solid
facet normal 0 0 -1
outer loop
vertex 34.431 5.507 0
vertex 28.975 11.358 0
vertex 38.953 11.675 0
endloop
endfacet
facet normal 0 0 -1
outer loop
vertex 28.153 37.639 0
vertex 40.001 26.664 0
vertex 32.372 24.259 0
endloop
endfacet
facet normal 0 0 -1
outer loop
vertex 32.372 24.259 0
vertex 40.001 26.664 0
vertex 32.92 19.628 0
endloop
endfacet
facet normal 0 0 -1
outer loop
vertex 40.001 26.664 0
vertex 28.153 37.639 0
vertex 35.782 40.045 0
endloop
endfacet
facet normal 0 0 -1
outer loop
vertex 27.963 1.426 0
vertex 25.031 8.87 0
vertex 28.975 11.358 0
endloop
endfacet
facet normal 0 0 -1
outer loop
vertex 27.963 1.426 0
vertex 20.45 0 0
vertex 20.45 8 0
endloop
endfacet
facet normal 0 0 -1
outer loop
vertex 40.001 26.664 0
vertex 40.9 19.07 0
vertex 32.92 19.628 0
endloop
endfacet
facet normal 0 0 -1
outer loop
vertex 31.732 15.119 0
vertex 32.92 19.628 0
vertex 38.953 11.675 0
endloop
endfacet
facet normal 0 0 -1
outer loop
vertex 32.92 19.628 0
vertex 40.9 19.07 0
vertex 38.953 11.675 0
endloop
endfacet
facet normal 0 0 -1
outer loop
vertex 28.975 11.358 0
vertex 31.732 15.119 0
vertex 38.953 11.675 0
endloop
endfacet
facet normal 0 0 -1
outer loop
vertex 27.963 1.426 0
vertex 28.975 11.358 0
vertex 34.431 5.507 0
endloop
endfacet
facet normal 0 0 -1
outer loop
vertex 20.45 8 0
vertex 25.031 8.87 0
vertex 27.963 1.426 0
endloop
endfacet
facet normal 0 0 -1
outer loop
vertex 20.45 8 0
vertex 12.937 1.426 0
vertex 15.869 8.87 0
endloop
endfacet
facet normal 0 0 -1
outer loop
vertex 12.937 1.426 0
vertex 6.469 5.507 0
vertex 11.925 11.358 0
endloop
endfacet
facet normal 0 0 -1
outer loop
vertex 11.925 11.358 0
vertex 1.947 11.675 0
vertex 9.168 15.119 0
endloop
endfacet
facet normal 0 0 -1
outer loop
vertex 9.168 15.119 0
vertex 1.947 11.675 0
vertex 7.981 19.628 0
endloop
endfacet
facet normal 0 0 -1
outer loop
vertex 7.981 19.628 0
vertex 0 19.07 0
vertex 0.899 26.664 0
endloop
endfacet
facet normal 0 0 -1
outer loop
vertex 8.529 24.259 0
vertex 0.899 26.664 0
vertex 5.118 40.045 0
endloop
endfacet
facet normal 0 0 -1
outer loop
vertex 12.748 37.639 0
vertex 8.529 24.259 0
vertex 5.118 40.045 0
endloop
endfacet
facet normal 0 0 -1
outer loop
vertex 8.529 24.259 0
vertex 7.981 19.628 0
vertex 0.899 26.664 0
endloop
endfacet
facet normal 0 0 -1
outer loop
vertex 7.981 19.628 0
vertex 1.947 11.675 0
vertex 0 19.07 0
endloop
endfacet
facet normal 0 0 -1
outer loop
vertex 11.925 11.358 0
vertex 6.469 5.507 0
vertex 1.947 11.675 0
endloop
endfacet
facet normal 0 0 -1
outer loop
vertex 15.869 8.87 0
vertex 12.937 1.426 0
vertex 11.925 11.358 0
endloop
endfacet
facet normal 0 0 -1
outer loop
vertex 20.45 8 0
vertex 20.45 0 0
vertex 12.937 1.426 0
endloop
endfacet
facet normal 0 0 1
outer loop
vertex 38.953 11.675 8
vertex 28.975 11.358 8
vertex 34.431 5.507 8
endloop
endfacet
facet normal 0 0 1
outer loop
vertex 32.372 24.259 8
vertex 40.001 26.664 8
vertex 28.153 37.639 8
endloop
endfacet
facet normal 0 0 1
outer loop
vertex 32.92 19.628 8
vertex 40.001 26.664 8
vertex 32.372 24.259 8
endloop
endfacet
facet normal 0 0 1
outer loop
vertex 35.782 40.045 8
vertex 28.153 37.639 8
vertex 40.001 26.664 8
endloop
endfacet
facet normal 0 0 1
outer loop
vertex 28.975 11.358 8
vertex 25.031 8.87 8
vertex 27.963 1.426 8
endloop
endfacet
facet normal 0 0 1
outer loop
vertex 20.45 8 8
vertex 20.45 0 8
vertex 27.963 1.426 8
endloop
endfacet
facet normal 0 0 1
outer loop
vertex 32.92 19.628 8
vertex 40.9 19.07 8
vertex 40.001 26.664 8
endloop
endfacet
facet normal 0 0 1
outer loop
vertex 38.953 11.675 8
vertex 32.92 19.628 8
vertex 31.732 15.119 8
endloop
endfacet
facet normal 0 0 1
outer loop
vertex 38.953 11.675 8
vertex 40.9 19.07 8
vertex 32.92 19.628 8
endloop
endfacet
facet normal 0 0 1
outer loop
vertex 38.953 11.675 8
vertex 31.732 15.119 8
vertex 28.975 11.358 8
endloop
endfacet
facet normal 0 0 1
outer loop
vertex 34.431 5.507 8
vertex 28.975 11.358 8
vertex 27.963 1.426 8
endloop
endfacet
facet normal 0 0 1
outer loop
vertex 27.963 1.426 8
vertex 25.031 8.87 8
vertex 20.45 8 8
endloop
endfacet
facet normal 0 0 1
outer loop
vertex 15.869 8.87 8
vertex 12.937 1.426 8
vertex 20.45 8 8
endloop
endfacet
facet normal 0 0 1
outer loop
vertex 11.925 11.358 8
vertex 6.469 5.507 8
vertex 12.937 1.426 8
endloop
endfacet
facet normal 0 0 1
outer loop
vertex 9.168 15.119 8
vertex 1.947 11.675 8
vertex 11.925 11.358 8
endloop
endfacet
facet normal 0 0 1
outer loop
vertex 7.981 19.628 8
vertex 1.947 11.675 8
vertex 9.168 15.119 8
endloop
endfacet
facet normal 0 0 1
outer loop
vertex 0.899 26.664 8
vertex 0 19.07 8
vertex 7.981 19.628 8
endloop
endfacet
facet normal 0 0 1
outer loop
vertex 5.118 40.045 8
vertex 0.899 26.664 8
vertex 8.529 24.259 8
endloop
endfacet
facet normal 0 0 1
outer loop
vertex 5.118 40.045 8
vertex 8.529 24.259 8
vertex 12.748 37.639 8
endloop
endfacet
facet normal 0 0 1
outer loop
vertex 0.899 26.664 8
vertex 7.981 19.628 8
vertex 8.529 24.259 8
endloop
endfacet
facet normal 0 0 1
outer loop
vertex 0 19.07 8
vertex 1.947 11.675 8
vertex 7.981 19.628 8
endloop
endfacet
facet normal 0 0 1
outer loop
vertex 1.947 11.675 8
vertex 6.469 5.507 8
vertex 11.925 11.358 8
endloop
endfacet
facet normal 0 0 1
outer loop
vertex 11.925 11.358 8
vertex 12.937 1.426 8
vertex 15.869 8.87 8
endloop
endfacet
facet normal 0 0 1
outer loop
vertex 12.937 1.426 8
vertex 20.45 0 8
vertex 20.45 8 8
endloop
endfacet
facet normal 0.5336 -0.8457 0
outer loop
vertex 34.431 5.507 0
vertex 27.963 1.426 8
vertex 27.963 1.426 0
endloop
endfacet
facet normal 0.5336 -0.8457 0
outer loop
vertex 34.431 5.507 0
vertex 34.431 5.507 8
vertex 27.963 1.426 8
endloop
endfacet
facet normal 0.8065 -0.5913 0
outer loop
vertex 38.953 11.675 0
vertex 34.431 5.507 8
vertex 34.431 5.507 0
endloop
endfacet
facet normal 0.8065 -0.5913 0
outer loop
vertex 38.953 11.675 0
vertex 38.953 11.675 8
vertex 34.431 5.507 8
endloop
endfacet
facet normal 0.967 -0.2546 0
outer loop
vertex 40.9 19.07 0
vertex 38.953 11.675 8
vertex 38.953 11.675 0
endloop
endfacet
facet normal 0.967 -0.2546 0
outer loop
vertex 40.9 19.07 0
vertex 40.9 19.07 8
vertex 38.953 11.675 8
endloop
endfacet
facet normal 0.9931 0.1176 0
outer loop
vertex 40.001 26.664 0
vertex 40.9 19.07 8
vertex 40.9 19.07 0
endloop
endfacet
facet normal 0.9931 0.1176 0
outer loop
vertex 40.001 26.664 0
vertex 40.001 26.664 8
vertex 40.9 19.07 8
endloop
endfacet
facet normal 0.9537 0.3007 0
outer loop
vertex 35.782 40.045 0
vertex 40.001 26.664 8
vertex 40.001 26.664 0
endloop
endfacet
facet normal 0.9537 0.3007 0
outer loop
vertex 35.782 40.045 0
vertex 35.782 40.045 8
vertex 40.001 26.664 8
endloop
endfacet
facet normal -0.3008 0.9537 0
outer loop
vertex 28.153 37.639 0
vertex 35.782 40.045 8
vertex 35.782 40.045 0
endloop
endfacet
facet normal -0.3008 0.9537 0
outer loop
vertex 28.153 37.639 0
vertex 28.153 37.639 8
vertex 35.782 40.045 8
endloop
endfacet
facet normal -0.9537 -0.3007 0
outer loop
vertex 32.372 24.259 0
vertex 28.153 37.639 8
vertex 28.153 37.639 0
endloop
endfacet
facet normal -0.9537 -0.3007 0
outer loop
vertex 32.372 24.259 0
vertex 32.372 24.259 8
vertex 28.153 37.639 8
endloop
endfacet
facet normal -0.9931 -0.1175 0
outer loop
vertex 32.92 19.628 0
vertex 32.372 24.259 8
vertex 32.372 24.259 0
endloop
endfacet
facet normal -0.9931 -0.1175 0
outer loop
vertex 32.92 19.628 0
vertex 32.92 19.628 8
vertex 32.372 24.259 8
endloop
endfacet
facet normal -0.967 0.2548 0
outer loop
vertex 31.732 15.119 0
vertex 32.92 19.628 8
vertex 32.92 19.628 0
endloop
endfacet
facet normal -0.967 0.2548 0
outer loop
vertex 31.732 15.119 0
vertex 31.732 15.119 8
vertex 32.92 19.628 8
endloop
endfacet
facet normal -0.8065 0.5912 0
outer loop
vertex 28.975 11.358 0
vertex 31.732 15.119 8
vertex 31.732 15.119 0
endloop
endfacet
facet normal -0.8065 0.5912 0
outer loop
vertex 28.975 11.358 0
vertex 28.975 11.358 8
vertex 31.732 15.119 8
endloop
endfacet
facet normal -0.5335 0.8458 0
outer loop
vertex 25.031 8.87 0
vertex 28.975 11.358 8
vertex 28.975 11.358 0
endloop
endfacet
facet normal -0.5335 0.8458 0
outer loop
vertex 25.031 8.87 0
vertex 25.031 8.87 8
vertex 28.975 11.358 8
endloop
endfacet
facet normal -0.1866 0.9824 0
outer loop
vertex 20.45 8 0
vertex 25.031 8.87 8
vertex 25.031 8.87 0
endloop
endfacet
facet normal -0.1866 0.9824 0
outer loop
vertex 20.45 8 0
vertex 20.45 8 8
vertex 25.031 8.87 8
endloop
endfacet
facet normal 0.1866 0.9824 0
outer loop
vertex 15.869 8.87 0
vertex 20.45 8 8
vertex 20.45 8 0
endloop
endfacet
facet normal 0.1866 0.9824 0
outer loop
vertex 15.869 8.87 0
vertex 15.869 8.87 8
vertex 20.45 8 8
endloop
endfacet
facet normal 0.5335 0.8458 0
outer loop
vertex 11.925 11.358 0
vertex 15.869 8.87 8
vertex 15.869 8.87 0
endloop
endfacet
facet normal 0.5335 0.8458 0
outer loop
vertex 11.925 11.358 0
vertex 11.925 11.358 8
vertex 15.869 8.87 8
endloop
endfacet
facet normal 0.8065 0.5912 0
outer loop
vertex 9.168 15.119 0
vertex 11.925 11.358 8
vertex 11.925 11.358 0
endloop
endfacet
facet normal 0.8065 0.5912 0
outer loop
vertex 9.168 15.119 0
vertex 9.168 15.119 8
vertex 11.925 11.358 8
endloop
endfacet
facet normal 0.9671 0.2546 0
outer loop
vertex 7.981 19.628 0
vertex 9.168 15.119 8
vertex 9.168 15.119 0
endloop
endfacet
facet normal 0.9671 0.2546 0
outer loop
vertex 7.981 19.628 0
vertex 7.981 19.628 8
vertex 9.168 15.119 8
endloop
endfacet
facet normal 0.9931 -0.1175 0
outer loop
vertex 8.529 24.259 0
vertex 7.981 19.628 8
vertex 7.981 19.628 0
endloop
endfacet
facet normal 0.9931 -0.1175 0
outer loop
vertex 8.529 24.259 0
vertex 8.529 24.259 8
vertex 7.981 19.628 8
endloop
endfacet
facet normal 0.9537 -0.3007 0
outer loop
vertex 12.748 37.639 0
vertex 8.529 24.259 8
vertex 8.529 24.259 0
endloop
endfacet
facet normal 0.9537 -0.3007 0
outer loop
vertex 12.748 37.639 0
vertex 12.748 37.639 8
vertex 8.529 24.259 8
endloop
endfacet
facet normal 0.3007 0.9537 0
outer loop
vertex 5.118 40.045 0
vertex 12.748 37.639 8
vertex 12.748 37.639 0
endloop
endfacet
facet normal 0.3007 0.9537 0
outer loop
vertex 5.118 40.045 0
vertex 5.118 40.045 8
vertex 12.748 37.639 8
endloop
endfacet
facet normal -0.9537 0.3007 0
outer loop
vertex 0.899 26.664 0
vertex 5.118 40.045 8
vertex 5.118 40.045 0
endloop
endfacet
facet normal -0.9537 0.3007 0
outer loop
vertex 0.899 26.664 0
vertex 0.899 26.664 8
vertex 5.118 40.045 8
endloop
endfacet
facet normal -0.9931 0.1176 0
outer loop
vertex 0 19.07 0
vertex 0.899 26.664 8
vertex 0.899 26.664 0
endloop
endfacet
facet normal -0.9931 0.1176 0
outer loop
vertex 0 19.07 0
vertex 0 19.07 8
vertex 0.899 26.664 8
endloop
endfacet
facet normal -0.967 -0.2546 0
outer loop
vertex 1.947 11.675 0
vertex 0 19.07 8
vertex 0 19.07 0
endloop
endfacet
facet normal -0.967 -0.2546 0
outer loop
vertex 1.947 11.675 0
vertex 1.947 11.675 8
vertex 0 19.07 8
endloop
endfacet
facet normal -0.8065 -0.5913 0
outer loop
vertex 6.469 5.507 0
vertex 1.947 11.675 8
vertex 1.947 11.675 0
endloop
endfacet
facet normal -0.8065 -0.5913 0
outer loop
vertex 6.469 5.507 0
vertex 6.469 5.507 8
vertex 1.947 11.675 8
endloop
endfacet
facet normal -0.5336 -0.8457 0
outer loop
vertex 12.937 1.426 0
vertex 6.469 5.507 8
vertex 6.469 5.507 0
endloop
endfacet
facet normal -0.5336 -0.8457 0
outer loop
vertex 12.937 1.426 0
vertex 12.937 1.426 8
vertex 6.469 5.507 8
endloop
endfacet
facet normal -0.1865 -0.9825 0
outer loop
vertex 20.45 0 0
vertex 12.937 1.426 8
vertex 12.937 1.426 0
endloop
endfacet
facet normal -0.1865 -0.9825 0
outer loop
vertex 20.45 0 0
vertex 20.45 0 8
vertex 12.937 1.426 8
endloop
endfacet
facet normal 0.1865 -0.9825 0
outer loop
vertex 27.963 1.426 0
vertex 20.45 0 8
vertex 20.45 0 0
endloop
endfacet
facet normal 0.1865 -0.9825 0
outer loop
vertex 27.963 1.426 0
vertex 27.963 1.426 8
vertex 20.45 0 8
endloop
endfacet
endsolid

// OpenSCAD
$fn = 32;

// ----------------------------------------------------------------------
// Clip blank: omega clip, 8 mm thick
// ----------------------------------------------------------------------

// --- parameters (mm) ---
profile_height = 8;       // extrusion height
profile_points = 26;      // points of the closed outline

profile = [[0.899, 26.664], [0, 19.07], [1.947, 11.675], [6.469, 5.507], [12.937, 1.426], [20.45, 0], [27.963, 1.426], [34.431, 5.507], [38.953, 11.675], [40.9, 19.07], [40.001, 26.664], [35.782, 40.045], [28.153, 37.639], [32.372, 24.259], [32.92, 19.628], [31.732, 15.119], [28.975, 11.358], [25.031, 8.87], [20.45, 8], [15.869, 8.87], [11.925, 11.358], [9.168, 15.119], [7.981, 19.628], [8.529, 24.259], [12.748, 37.639], [5.118, 40.045]];  // single closed polygon, 26 points, counter clockwise

// --- the one profile operation ---
linear_extrude(height = profile_height) polygon(points = profile);
